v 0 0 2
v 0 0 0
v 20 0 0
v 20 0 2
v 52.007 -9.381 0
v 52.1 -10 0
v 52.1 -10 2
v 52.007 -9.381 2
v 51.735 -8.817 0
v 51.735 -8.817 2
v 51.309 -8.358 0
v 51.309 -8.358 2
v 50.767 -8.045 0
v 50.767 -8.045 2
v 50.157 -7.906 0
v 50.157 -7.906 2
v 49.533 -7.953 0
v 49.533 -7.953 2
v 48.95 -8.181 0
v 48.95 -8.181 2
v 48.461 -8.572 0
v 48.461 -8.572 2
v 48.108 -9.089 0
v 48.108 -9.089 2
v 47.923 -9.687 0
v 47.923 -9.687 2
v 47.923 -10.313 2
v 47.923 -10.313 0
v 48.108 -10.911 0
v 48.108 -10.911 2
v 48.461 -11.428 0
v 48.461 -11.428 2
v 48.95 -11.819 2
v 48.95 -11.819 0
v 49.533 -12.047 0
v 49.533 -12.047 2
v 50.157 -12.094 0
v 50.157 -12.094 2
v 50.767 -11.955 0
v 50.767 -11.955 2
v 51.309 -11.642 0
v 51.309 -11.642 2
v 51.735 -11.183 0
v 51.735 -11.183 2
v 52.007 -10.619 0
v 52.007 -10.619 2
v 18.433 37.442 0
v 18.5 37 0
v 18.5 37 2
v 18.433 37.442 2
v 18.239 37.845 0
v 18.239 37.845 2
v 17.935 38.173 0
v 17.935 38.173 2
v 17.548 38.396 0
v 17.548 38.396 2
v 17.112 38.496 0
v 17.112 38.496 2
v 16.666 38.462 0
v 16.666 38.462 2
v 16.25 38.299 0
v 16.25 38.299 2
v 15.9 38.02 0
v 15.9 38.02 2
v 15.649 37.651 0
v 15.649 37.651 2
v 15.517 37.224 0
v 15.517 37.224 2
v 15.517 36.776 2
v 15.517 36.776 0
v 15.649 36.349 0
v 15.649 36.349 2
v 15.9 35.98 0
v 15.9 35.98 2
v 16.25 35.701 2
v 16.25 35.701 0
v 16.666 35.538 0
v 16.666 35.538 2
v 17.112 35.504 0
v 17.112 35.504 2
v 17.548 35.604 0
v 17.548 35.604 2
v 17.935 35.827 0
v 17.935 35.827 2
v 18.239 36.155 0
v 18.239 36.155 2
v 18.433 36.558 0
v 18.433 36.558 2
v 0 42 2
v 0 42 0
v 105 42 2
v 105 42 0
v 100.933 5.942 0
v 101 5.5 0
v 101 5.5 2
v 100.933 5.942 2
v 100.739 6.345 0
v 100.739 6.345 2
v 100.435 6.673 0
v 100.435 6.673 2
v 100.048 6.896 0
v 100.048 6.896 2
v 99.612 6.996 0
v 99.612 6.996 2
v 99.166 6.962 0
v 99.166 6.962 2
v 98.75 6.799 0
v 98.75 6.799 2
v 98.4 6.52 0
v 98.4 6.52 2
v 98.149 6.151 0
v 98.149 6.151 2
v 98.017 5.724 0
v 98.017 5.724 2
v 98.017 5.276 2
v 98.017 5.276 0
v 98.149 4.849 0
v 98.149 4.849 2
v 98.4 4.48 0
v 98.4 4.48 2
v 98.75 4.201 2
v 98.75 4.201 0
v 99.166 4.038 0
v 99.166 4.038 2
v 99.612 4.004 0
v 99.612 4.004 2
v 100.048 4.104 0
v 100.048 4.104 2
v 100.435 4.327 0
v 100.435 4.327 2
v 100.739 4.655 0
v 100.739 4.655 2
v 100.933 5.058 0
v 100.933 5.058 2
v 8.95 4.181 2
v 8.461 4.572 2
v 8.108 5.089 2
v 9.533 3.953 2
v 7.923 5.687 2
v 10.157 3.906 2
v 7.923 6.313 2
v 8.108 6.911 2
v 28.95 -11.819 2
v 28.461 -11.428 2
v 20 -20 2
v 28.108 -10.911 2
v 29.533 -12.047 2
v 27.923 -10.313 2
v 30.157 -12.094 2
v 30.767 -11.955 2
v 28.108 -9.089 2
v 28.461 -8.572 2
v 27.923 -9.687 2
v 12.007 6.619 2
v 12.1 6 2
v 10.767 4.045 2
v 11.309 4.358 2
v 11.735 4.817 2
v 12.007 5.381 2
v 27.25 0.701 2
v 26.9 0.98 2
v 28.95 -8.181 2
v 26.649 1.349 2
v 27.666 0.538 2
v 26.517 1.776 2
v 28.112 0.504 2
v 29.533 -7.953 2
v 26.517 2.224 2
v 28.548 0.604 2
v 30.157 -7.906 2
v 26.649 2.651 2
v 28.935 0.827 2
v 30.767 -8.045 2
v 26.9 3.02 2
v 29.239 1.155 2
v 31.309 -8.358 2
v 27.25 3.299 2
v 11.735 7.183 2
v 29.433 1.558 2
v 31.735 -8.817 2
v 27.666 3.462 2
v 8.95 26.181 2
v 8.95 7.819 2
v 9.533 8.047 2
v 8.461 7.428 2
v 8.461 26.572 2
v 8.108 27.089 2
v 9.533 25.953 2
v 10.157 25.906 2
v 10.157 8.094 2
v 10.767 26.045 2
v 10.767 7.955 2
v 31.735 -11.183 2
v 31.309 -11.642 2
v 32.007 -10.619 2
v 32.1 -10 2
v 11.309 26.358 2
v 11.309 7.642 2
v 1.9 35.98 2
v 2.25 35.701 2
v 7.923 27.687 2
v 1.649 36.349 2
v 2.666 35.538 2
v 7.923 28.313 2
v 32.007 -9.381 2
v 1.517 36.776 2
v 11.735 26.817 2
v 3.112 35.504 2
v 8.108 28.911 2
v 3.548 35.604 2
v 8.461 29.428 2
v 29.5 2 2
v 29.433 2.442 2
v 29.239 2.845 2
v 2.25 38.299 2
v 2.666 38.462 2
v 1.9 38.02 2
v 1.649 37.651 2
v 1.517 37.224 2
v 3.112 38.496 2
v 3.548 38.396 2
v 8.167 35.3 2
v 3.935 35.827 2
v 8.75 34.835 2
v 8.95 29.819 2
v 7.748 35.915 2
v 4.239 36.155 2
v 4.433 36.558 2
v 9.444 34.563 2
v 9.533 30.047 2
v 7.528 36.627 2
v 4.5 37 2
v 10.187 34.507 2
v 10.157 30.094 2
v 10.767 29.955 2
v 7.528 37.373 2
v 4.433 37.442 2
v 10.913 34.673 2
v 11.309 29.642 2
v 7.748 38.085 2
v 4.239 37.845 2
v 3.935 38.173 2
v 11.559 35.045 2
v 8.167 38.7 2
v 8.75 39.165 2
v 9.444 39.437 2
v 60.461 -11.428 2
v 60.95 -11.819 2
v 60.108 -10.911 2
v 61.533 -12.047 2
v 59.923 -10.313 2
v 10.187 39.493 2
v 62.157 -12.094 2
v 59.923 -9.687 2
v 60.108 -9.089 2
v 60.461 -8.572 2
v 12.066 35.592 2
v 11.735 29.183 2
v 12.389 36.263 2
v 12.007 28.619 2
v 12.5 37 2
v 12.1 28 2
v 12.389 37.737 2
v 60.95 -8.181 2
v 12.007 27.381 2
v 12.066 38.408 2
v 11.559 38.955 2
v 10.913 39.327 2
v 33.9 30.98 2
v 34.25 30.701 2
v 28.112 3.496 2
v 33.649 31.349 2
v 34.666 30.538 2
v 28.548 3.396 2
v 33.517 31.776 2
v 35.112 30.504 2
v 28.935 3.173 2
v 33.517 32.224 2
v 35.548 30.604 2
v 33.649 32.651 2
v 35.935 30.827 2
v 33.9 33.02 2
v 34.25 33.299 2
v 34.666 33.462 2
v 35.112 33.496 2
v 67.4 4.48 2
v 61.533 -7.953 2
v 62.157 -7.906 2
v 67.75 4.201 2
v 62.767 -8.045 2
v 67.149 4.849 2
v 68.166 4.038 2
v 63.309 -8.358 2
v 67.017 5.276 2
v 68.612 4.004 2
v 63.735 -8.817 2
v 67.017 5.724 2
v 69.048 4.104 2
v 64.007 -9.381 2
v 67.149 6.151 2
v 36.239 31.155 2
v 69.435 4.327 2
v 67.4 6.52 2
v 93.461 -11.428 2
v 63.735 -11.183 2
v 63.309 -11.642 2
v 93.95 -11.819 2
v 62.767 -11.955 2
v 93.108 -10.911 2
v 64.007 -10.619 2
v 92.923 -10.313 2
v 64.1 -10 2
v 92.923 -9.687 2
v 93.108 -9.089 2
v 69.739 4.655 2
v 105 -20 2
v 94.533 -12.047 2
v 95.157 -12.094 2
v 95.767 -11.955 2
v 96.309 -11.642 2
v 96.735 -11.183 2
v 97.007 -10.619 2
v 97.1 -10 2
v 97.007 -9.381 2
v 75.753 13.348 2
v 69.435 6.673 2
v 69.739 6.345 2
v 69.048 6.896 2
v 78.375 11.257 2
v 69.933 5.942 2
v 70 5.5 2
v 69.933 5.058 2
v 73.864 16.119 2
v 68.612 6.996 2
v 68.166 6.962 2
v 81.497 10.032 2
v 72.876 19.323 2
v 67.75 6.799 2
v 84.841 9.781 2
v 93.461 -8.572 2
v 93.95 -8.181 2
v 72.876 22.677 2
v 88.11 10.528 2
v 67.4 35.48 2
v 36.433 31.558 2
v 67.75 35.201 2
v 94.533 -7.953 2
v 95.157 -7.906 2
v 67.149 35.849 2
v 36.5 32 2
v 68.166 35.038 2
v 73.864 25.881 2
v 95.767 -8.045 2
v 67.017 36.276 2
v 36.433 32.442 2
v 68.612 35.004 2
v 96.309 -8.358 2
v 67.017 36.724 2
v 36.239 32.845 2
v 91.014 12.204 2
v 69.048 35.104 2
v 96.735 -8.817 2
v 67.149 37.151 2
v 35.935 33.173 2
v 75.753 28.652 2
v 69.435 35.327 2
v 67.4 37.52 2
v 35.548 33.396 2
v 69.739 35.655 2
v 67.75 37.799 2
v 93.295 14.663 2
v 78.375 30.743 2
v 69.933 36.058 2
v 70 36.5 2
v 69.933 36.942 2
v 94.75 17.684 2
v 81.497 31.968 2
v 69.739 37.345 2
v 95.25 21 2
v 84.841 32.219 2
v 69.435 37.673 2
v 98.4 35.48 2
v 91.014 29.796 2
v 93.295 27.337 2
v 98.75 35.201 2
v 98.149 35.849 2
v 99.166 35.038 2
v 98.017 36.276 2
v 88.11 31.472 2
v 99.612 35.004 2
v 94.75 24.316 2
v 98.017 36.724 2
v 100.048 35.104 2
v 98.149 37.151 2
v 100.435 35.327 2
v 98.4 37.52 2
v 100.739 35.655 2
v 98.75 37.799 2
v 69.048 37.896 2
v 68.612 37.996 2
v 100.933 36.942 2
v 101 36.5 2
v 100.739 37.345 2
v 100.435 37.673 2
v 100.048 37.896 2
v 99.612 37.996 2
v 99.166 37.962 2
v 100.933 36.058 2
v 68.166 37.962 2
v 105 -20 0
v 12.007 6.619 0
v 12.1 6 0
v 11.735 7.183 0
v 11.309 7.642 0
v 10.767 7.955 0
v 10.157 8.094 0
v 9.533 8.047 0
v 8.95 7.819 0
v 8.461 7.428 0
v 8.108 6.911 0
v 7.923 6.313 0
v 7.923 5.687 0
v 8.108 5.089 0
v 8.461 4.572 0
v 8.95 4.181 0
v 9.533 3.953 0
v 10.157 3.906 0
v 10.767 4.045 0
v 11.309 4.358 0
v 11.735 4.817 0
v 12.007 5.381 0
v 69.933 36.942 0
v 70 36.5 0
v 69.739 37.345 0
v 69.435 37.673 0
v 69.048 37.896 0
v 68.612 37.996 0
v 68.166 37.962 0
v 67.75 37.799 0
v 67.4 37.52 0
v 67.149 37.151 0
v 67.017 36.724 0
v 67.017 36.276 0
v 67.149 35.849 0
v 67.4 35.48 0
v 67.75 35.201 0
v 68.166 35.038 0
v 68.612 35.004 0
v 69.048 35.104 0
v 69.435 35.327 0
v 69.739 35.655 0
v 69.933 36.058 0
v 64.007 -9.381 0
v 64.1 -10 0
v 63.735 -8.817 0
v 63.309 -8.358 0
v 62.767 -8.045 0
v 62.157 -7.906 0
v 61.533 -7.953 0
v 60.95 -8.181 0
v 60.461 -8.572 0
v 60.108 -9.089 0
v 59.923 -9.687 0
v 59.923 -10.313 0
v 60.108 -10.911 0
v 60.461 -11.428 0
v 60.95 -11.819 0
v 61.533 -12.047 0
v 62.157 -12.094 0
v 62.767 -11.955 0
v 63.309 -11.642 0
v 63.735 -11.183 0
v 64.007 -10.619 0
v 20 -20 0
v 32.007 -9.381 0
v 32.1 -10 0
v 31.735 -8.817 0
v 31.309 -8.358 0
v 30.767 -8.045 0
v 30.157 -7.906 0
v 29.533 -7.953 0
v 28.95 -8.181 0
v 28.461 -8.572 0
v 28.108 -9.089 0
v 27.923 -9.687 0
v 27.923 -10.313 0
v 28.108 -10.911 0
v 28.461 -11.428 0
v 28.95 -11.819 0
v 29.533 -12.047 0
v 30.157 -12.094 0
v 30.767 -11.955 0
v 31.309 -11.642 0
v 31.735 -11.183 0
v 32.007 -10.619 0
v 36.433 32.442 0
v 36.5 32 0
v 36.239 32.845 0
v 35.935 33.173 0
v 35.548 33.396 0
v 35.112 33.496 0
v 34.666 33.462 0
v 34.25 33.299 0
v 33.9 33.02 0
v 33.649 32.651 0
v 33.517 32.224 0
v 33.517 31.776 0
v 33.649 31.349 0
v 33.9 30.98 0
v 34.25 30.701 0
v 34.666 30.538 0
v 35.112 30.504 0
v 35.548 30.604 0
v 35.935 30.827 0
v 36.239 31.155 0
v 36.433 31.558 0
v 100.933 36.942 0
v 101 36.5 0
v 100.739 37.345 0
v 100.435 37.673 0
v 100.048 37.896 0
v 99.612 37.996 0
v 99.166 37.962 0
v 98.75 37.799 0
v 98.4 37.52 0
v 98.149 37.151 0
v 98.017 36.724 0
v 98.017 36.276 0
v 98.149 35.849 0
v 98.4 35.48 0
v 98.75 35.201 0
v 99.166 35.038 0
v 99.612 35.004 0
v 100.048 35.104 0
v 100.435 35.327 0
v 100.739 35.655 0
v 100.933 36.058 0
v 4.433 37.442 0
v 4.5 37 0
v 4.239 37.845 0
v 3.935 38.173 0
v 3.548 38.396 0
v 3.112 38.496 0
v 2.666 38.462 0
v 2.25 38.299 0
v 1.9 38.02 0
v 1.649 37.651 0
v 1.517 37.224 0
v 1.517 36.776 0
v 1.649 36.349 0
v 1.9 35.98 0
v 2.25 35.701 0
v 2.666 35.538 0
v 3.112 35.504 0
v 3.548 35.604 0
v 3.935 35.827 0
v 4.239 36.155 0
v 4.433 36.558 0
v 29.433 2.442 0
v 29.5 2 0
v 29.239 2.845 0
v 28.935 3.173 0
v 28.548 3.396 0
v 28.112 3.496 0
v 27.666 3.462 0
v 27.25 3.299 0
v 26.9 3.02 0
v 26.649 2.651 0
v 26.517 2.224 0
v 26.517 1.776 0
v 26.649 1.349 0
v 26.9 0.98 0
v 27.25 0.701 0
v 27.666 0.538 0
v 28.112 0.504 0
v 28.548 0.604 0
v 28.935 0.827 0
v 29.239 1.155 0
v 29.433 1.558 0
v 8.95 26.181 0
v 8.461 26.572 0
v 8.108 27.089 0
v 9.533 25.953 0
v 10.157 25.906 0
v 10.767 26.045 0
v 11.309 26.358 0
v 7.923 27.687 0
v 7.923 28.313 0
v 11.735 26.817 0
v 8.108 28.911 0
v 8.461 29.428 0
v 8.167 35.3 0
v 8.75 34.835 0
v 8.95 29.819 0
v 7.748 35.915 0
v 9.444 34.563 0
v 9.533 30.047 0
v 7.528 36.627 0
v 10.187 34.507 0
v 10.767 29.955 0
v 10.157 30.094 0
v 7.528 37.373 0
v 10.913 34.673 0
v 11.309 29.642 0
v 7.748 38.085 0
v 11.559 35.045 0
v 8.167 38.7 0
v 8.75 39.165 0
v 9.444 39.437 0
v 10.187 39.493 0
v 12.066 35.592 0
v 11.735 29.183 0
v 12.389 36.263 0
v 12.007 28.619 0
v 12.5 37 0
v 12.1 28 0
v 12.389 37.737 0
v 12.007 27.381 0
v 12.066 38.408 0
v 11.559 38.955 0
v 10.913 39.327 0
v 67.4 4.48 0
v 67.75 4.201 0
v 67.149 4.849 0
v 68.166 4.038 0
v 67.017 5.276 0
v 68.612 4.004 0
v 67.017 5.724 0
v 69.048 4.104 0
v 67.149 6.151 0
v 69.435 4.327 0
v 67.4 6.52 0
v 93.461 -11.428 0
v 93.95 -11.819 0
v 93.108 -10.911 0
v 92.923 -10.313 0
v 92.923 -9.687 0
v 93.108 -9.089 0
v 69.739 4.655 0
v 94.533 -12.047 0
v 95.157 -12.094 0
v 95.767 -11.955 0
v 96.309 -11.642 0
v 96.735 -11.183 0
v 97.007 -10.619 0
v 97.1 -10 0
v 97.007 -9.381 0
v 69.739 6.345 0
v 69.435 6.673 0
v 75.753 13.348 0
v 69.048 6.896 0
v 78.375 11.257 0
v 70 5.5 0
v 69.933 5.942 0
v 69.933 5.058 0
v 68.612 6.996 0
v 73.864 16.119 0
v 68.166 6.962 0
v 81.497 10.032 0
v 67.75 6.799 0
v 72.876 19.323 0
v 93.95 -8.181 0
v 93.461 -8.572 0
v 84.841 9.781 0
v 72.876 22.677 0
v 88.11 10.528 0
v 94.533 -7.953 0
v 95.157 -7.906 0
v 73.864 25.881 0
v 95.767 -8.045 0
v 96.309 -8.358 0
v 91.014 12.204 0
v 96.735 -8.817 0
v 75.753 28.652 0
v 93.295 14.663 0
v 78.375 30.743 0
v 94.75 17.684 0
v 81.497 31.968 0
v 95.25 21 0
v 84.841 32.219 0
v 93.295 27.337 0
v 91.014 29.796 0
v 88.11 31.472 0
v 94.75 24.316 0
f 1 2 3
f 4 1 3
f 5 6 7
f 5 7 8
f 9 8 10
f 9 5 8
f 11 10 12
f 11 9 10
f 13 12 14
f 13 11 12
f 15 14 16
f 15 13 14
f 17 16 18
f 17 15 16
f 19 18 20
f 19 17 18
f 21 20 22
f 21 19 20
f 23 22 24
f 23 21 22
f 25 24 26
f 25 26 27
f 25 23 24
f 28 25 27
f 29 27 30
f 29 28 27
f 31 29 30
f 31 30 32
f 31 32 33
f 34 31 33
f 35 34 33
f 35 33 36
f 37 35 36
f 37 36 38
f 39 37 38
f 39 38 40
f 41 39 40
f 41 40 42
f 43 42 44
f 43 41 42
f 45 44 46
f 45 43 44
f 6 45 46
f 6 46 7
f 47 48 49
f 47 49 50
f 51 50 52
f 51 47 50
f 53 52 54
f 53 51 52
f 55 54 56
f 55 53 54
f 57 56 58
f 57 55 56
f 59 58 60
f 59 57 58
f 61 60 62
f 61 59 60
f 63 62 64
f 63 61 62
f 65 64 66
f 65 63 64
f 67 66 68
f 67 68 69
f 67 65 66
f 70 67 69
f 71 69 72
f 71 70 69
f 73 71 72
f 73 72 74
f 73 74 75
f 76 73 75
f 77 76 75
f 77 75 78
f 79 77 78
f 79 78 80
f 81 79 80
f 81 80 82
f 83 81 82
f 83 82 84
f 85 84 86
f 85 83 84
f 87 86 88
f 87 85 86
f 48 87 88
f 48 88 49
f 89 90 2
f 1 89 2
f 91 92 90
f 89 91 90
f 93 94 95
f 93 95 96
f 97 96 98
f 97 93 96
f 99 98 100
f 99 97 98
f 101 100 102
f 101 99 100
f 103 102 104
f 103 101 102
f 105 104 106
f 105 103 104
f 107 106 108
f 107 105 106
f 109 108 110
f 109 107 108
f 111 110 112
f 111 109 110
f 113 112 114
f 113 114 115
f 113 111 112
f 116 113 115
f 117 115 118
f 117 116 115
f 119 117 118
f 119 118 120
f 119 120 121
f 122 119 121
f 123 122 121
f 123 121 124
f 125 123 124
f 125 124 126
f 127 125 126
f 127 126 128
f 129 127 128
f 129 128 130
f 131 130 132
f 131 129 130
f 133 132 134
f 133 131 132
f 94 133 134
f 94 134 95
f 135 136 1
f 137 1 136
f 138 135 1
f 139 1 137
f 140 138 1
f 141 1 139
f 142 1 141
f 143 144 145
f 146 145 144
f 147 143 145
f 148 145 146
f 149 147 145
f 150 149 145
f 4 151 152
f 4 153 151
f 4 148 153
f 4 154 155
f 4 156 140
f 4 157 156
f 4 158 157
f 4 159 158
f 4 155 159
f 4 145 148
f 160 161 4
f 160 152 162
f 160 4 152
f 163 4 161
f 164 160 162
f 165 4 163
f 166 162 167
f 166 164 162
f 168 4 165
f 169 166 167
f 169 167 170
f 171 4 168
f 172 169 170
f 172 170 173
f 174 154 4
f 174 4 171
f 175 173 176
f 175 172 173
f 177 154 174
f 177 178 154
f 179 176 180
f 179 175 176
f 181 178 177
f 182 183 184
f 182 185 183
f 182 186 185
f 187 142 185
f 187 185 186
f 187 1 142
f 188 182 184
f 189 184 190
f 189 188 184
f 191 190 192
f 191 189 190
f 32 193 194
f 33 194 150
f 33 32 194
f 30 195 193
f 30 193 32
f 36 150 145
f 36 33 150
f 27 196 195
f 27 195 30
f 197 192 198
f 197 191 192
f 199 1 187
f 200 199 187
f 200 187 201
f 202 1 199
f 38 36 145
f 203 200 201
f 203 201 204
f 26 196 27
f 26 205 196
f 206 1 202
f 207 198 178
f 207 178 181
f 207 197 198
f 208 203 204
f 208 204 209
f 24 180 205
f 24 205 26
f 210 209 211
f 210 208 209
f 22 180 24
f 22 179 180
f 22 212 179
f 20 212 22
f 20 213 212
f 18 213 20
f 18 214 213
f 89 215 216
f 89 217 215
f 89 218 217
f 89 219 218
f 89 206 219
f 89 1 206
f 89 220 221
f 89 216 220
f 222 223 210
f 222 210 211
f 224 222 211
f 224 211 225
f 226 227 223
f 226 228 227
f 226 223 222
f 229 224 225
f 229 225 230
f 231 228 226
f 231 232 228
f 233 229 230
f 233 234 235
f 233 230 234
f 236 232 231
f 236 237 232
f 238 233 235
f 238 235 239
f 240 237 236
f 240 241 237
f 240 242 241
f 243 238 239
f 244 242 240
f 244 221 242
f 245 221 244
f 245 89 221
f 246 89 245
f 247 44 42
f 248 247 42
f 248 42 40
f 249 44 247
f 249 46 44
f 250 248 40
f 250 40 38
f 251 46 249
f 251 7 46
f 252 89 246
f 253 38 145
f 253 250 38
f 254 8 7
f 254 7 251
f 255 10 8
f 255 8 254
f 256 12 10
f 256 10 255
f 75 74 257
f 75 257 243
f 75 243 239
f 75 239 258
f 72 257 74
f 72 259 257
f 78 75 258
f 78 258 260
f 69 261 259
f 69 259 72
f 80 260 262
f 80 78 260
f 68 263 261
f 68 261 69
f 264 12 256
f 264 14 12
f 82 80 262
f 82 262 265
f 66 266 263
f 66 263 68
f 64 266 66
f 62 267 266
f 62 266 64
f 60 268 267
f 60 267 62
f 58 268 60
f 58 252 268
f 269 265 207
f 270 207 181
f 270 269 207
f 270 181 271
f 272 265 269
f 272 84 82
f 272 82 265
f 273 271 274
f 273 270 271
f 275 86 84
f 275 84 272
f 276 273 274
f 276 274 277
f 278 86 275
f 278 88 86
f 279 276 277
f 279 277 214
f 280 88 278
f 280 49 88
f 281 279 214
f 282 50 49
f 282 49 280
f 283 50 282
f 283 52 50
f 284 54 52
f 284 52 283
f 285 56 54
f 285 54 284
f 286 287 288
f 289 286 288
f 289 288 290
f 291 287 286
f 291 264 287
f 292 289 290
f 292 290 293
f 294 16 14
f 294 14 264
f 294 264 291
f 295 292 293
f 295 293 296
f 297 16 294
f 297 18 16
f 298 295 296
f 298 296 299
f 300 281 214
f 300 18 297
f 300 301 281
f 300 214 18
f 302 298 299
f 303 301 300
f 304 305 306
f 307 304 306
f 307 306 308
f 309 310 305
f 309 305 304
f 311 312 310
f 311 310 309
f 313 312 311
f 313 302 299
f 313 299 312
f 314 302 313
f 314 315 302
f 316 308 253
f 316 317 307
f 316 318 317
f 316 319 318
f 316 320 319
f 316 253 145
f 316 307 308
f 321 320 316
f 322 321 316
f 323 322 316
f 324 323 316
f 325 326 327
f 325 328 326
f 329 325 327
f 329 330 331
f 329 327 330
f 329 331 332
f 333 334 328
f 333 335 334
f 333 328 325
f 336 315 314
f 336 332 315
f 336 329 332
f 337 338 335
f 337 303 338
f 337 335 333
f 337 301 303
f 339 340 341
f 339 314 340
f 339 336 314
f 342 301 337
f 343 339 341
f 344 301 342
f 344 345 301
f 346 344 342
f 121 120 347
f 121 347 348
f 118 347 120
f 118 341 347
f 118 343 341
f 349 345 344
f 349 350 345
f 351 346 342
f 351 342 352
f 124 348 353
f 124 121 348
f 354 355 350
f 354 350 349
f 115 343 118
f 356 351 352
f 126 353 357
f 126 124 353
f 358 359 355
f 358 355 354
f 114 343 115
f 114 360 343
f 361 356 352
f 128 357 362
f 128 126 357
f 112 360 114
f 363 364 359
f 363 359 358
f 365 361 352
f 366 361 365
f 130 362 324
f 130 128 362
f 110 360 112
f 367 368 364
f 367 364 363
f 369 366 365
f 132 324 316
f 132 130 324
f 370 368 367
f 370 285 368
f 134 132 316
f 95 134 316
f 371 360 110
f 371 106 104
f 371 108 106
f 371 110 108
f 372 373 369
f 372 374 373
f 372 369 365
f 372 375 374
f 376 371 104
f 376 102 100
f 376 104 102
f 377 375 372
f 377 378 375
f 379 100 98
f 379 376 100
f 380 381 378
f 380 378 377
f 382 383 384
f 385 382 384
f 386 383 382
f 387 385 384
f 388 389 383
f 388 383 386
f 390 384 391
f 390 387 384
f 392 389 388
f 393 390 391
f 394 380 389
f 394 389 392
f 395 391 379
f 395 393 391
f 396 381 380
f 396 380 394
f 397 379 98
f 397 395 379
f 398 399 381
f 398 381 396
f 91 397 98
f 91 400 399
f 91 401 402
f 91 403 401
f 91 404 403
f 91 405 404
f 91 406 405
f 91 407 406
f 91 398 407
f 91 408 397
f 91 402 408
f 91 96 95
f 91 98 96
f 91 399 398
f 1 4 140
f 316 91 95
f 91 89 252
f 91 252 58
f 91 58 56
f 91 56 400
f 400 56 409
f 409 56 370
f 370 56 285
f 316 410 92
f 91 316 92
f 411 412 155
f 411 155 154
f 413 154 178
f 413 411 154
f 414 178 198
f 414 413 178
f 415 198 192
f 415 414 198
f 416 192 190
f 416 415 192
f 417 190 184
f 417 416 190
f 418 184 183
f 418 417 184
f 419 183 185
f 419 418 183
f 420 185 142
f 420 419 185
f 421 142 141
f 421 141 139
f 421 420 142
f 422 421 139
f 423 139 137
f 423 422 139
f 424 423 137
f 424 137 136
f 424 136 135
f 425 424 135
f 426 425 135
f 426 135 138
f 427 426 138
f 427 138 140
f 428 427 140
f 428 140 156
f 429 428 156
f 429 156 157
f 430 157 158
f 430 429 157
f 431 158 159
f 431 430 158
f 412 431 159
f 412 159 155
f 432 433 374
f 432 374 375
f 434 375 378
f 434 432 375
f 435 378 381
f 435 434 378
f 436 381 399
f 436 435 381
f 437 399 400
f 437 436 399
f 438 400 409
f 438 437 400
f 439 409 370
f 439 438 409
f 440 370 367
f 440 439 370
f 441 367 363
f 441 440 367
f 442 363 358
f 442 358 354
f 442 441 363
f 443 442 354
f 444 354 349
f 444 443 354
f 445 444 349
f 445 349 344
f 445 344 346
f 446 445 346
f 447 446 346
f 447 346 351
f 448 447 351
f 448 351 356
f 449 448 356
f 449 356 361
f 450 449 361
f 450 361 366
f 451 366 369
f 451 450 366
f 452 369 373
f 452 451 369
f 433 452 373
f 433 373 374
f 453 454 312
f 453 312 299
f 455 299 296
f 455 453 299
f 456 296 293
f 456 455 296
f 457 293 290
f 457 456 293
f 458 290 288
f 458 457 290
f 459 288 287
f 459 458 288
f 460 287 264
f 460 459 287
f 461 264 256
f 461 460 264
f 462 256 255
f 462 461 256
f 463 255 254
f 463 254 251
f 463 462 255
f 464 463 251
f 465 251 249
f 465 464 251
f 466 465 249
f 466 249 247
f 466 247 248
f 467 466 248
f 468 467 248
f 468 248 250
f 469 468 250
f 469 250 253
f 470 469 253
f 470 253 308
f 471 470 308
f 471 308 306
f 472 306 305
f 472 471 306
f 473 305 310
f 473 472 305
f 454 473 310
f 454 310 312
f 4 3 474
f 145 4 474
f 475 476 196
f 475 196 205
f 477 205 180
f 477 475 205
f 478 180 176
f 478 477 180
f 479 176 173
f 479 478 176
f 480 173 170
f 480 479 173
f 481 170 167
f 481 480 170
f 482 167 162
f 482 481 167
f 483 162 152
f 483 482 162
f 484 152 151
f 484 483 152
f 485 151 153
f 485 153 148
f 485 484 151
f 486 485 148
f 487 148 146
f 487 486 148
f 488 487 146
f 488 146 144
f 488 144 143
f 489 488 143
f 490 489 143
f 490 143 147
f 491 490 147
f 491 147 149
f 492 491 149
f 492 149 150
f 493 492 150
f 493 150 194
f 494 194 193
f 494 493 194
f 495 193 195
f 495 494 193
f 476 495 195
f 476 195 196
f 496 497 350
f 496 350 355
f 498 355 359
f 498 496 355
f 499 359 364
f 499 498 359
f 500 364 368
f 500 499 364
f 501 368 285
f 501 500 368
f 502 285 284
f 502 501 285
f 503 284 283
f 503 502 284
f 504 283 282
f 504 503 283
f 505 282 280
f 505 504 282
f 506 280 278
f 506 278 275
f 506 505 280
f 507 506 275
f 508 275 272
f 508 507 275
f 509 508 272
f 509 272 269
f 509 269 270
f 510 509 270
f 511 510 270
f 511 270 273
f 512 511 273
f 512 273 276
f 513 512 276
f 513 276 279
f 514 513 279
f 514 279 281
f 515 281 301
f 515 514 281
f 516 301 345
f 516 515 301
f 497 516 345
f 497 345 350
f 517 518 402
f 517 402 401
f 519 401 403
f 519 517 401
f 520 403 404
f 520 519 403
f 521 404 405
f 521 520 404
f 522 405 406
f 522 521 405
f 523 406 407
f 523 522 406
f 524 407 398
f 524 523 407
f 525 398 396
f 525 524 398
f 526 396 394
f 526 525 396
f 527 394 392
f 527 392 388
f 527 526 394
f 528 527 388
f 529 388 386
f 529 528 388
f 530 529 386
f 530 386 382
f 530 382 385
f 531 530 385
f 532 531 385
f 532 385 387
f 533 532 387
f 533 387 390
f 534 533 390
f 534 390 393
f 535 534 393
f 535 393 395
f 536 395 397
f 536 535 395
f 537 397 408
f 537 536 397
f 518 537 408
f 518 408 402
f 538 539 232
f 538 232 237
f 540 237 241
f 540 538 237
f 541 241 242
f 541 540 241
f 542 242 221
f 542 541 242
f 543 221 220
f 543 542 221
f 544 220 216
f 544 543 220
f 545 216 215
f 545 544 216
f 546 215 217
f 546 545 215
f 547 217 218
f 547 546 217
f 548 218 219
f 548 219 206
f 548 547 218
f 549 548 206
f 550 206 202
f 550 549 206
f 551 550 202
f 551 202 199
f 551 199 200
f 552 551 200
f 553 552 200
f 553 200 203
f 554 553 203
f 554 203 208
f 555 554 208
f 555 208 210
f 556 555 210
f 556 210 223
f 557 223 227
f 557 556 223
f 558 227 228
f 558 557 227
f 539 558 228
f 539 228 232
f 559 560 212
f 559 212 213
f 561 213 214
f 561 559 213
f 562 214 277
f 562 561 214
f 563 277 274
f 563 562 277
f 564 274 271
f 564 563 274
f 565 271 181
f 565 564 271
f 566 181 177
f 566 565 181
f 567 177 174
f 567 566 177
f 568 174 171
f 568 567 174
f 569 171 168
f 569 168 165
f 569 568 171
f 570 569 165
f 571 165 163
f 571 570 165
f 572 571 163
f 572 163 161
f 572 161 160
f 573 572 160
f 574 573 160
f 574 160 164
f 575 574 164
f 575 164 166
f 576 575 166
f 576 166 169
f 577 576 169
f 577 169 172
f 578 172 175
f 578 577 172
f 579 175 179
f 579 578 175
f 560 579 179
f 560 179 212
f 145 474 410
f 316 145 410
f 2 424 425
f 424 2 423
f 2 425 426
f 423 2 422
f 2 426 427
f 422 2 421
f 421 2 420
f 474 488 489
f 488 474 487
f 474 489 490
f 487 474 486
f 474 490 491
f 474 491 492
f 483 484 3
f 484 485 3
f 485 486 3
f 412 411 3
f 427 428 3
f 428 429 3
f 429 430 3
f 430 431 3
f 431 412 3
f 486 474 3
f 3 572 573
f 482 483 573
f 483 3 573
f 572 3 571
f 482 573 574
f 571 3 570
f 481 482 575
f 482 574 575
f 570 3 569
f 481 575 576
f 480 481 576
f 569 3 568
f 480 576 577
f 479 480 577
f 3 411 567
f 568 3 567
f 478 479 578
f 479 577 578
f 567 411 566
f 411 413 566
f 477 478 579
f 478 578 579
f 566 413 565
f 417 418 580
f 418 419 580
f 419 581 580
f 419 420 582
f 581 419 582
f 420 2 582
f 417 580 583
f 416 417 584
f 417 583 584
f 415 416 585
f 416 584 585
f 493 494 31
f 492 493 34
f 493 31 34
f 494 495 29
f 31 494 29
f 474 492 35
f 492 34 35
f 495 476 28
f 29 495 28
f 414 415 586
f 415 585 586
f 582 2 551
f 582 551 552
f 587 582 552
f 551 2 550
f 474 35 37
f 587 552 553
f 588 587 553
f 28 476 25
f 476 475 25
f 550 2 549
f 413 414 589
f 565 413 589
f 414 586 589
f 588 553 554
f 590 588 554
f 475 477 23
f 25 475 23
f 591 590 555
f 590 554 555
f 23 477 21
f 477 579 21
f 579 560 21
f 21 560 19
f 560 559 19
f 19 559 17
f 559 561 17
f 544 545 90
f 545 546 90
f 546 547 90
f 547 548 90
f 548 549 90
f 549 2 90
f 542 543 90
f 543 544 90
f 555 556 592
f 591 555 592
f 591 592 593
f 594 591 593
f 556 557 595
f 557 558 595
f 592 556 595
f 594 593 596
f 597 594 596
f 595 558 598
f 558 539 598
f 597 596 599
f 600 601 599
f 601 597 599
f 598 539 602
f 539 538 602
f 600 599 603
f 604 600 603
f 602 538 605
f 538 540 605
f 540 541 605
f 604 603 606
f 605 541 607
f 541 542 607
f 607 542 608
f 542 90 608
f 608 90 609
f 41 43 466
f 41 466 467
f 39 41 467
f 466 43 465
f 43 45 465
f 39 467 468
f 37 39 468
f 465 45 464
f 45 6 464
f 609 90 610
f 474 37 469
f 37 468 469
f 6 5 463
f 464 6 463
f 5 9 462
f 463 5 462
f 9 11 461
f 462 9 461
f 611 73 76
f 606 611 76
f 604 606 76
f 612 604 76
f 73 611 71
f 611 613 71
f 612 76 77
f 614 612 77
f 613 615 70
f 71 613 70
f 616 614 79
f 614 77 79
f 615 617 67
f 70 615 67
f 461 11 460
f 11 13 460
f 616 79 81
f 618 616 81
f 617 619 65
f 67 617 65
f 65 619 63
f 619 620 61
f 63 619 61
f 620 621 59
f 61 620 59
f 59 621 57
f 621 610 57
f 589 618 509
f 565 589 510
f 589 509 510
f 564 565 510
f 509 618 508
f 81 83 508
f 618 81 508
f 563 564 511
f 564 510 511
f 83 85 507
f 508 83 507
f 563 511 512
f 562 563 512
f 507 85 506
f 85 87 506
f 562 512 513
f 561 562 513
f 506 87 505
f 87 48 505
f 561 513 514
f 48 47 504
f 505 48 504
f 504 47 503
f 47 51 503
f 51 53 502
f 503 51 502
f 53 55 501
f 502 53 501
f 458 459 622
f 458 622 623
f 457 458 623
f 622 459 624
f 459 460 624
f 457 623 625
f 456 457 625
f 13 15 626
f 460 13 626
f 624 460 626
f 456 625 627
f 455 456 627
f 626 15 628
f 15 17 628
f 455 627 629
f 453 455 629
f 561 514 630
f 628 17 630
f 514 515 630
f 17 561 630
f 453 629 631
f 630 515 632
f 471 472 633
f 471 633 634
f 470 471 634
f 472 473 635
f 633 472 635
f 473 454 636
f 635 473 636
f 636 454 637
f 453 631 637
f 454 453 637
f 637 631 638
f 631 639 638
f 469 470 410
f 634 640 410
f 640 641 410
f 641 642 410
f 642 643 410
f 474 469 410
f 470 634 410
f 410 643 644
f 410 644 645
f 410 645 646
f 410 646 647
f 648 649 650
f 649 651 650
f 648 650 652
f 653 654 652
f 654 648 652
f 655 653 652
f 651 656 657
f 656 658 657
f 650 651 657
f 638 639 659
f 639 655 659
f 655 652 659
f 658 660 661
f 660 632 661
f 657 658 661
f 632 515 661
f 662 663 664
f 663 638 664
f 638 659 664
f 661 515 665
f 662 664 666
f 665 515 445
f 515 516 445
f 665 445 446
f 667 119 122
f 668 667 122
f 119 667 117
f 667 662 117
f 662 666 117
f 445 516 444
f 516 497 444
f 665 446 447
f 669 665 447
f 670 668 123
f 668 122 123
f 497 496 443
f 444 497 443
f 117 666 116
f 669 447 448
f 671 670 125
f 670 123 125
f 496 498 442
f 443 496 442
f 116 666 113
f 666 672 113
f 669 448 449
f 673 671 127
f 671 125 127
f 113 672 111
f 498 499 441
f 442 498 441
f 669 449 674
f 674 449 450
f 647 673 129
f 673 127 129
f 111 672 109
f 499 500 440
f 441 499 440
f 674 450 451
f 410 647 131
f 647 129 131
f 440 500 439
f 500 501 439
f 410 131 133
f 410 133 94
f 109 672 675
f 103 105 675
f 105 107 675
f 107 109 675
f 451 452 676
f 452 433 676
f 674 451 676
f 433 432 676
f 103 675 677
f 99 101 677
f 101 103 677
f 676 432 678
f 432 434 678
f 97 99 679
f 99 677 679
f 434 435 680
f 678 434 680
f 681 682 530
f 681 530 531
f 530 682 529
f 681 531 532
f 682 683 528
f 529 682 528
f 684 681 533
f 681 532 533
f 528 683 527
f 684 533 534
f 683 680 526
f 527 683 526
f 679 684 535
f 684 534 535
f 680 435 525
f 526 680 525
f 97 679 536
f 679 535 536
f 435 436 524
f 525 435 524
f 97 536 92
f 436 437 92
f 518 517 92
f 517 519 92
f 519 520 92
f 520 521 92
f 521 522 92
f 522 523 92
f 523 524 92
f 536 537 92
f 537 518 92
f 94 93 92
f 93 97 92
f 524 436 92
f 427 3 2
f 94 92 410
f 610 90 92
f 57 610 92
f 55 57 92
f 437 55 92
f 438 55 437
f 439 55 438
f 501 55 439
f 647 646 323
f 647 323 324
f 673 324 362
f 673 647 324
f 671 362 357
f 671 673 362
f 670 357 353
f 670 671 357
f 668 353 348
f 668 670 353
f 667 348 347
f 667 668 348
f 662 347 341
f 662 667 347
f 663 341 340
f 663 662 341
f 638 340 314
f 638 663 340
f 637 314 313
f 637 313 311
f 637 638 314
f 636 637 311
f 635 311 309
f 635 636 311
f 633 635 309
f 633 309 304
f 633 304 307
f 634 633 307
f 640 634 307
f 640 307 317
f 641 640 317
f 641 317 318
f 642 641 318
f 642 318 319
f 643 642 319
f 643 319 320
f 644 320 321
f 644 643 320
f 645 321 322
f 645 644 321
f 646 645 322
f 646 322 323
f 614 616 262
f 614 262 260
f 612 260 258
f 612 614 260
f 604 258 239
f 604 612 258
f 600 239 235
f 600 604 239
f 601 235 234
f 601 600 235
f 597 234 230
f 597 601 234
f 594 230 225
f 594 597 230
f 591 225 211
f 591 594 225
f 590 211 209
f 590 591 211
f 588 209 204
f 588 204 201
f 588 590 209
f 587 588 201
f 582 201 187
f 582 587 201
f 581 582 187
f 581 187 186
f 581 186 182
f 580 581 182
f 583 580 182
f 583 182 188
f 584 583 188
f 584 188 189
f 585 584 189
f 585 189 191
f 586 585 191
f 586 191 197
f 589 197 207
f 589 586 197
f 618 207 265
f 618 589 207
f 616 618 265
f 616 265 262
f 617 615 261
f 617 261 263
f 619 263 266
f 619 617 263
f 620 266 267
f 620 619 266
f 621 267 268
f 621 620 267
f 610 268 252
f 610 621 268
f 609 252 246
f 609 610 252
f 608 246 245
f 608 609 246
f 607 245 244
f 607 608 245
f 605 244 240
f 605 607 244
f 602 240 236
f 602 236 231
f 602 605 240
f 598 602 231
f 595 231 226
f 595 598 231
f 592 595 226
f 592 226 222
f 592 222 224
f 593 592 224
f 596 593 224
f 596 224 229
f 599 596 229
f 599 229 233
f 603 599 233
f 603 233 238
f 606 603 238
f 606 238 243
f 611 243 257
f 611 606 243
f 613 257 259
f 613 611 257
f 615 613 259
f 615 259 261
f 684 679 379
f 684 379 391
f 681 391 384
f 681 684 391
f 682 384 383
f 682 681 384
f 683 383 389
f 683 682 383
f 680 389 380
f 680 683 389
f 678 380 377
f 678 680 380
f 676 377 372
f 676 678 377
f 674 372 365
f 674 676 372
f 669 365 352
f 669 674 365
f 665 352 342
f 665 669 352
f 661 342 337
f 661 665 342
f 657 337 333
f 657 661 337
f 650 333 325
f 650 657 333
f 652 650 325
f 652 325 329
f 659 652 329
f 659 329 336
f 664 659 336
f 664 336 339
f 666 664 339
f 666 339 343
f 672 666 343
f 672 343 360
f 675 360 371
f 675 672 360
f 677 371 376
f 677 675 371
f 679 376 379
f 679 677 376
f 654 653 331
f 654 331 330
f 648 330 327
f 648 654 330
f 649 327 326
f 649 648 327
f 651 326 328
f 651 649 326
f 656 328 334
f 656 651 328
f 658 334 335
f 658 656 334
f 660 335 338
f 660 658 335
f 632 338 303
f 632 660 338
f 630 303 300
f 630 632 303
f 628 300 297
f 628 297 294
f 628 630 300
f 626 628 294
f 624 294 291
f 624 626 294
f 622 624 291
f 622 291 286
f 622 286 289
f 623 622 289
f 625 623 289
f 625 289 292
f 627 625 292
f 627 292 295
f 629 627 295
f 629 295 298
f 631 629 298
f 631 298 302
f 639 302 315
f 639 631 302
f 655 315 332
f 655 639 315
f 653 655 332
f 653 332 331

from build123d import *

# Parameters (mm, degrees)
SKETCH1_R           = 1.5
SKETCH1_R_2         = 11.25
SKETCH1_R_3         = 2.1
SKETCH1_R_4         = 2.5
BOSS_EXTRUDE1_DEPTH = 2


with BuildPart() as part:
    # Sketch1 → Boss-Extrude1 (new body)
    with BuildSketch(Plane.XY):
        Polygon((0, 0), (20, 0), (20, -20), (105, -20), (105, 42), (0, 42), align=None)
        with Locations((3, 37)):
            Circle(SKETCH1_R, mode=Mode.SUBTRACT)
        with Locations((17, 37)):
            Circle(SKETCH1_R, mode=Mode.SUBTRACT)
        with Locations((84, 21)):
            Circle(SKETCH1_R_2, mode=Mode.SUBTRACT)
        with Locations((99.5, 36.5)):
            Circle(SKETCH1_R, mode=Mode.SUBTRACT)
        with Locations((68.5, 36.5)):
            Circle(SKETCH1_R, mode=Mode.SUBTRACT)
        with Locations((68.5, 5.5)):
            Circle(SKETCH1_R, mode=Mode.SUBTRACT)
        with Locations((99.5, 5.5)):
            Circle(SKETCH1_R, mode=Mode.SUBTRACT)
        with Locations((35, 32)):
            Circle(SKETCH1_R, mode=Mode.SUBTRACT)
        with Locations((28, 2)):
            Circle(SKETCH1_R, mode=Mode.SUBTRACT)
        with Locations((10, 28)):
            Circle(SKETCH1_R_3, mode=Mode.SUBTRACT)
        with Locations((10, 6)):
            Circle(SKETCH1_R_3, mode=Mode.SUBTRACT)
        with Locations((30, -10)):
            Circle(SKETCH1_R_3, mode=Mode.SUBTRACT)
        with Locations((95, -10)):
            Circle(SKETCH1_R_3, mode=Mode.SUBTRACT)
        with Locations((10, 37)):
            Circle(SKETCH1_R_4, mode=Mode.SUBTRACT)
        with Locations((50, -10)):
            Circle(SKETCH1_R_3, mode=Mode.SUBTRACT)
        with Locations((62, -10)):
            Circle(SKETCH1_R_3, mode=Mode.SUBTRACT)
    extrude(amount=BOSS_EXTRUDE1_DEPTH)


solid = part.part
